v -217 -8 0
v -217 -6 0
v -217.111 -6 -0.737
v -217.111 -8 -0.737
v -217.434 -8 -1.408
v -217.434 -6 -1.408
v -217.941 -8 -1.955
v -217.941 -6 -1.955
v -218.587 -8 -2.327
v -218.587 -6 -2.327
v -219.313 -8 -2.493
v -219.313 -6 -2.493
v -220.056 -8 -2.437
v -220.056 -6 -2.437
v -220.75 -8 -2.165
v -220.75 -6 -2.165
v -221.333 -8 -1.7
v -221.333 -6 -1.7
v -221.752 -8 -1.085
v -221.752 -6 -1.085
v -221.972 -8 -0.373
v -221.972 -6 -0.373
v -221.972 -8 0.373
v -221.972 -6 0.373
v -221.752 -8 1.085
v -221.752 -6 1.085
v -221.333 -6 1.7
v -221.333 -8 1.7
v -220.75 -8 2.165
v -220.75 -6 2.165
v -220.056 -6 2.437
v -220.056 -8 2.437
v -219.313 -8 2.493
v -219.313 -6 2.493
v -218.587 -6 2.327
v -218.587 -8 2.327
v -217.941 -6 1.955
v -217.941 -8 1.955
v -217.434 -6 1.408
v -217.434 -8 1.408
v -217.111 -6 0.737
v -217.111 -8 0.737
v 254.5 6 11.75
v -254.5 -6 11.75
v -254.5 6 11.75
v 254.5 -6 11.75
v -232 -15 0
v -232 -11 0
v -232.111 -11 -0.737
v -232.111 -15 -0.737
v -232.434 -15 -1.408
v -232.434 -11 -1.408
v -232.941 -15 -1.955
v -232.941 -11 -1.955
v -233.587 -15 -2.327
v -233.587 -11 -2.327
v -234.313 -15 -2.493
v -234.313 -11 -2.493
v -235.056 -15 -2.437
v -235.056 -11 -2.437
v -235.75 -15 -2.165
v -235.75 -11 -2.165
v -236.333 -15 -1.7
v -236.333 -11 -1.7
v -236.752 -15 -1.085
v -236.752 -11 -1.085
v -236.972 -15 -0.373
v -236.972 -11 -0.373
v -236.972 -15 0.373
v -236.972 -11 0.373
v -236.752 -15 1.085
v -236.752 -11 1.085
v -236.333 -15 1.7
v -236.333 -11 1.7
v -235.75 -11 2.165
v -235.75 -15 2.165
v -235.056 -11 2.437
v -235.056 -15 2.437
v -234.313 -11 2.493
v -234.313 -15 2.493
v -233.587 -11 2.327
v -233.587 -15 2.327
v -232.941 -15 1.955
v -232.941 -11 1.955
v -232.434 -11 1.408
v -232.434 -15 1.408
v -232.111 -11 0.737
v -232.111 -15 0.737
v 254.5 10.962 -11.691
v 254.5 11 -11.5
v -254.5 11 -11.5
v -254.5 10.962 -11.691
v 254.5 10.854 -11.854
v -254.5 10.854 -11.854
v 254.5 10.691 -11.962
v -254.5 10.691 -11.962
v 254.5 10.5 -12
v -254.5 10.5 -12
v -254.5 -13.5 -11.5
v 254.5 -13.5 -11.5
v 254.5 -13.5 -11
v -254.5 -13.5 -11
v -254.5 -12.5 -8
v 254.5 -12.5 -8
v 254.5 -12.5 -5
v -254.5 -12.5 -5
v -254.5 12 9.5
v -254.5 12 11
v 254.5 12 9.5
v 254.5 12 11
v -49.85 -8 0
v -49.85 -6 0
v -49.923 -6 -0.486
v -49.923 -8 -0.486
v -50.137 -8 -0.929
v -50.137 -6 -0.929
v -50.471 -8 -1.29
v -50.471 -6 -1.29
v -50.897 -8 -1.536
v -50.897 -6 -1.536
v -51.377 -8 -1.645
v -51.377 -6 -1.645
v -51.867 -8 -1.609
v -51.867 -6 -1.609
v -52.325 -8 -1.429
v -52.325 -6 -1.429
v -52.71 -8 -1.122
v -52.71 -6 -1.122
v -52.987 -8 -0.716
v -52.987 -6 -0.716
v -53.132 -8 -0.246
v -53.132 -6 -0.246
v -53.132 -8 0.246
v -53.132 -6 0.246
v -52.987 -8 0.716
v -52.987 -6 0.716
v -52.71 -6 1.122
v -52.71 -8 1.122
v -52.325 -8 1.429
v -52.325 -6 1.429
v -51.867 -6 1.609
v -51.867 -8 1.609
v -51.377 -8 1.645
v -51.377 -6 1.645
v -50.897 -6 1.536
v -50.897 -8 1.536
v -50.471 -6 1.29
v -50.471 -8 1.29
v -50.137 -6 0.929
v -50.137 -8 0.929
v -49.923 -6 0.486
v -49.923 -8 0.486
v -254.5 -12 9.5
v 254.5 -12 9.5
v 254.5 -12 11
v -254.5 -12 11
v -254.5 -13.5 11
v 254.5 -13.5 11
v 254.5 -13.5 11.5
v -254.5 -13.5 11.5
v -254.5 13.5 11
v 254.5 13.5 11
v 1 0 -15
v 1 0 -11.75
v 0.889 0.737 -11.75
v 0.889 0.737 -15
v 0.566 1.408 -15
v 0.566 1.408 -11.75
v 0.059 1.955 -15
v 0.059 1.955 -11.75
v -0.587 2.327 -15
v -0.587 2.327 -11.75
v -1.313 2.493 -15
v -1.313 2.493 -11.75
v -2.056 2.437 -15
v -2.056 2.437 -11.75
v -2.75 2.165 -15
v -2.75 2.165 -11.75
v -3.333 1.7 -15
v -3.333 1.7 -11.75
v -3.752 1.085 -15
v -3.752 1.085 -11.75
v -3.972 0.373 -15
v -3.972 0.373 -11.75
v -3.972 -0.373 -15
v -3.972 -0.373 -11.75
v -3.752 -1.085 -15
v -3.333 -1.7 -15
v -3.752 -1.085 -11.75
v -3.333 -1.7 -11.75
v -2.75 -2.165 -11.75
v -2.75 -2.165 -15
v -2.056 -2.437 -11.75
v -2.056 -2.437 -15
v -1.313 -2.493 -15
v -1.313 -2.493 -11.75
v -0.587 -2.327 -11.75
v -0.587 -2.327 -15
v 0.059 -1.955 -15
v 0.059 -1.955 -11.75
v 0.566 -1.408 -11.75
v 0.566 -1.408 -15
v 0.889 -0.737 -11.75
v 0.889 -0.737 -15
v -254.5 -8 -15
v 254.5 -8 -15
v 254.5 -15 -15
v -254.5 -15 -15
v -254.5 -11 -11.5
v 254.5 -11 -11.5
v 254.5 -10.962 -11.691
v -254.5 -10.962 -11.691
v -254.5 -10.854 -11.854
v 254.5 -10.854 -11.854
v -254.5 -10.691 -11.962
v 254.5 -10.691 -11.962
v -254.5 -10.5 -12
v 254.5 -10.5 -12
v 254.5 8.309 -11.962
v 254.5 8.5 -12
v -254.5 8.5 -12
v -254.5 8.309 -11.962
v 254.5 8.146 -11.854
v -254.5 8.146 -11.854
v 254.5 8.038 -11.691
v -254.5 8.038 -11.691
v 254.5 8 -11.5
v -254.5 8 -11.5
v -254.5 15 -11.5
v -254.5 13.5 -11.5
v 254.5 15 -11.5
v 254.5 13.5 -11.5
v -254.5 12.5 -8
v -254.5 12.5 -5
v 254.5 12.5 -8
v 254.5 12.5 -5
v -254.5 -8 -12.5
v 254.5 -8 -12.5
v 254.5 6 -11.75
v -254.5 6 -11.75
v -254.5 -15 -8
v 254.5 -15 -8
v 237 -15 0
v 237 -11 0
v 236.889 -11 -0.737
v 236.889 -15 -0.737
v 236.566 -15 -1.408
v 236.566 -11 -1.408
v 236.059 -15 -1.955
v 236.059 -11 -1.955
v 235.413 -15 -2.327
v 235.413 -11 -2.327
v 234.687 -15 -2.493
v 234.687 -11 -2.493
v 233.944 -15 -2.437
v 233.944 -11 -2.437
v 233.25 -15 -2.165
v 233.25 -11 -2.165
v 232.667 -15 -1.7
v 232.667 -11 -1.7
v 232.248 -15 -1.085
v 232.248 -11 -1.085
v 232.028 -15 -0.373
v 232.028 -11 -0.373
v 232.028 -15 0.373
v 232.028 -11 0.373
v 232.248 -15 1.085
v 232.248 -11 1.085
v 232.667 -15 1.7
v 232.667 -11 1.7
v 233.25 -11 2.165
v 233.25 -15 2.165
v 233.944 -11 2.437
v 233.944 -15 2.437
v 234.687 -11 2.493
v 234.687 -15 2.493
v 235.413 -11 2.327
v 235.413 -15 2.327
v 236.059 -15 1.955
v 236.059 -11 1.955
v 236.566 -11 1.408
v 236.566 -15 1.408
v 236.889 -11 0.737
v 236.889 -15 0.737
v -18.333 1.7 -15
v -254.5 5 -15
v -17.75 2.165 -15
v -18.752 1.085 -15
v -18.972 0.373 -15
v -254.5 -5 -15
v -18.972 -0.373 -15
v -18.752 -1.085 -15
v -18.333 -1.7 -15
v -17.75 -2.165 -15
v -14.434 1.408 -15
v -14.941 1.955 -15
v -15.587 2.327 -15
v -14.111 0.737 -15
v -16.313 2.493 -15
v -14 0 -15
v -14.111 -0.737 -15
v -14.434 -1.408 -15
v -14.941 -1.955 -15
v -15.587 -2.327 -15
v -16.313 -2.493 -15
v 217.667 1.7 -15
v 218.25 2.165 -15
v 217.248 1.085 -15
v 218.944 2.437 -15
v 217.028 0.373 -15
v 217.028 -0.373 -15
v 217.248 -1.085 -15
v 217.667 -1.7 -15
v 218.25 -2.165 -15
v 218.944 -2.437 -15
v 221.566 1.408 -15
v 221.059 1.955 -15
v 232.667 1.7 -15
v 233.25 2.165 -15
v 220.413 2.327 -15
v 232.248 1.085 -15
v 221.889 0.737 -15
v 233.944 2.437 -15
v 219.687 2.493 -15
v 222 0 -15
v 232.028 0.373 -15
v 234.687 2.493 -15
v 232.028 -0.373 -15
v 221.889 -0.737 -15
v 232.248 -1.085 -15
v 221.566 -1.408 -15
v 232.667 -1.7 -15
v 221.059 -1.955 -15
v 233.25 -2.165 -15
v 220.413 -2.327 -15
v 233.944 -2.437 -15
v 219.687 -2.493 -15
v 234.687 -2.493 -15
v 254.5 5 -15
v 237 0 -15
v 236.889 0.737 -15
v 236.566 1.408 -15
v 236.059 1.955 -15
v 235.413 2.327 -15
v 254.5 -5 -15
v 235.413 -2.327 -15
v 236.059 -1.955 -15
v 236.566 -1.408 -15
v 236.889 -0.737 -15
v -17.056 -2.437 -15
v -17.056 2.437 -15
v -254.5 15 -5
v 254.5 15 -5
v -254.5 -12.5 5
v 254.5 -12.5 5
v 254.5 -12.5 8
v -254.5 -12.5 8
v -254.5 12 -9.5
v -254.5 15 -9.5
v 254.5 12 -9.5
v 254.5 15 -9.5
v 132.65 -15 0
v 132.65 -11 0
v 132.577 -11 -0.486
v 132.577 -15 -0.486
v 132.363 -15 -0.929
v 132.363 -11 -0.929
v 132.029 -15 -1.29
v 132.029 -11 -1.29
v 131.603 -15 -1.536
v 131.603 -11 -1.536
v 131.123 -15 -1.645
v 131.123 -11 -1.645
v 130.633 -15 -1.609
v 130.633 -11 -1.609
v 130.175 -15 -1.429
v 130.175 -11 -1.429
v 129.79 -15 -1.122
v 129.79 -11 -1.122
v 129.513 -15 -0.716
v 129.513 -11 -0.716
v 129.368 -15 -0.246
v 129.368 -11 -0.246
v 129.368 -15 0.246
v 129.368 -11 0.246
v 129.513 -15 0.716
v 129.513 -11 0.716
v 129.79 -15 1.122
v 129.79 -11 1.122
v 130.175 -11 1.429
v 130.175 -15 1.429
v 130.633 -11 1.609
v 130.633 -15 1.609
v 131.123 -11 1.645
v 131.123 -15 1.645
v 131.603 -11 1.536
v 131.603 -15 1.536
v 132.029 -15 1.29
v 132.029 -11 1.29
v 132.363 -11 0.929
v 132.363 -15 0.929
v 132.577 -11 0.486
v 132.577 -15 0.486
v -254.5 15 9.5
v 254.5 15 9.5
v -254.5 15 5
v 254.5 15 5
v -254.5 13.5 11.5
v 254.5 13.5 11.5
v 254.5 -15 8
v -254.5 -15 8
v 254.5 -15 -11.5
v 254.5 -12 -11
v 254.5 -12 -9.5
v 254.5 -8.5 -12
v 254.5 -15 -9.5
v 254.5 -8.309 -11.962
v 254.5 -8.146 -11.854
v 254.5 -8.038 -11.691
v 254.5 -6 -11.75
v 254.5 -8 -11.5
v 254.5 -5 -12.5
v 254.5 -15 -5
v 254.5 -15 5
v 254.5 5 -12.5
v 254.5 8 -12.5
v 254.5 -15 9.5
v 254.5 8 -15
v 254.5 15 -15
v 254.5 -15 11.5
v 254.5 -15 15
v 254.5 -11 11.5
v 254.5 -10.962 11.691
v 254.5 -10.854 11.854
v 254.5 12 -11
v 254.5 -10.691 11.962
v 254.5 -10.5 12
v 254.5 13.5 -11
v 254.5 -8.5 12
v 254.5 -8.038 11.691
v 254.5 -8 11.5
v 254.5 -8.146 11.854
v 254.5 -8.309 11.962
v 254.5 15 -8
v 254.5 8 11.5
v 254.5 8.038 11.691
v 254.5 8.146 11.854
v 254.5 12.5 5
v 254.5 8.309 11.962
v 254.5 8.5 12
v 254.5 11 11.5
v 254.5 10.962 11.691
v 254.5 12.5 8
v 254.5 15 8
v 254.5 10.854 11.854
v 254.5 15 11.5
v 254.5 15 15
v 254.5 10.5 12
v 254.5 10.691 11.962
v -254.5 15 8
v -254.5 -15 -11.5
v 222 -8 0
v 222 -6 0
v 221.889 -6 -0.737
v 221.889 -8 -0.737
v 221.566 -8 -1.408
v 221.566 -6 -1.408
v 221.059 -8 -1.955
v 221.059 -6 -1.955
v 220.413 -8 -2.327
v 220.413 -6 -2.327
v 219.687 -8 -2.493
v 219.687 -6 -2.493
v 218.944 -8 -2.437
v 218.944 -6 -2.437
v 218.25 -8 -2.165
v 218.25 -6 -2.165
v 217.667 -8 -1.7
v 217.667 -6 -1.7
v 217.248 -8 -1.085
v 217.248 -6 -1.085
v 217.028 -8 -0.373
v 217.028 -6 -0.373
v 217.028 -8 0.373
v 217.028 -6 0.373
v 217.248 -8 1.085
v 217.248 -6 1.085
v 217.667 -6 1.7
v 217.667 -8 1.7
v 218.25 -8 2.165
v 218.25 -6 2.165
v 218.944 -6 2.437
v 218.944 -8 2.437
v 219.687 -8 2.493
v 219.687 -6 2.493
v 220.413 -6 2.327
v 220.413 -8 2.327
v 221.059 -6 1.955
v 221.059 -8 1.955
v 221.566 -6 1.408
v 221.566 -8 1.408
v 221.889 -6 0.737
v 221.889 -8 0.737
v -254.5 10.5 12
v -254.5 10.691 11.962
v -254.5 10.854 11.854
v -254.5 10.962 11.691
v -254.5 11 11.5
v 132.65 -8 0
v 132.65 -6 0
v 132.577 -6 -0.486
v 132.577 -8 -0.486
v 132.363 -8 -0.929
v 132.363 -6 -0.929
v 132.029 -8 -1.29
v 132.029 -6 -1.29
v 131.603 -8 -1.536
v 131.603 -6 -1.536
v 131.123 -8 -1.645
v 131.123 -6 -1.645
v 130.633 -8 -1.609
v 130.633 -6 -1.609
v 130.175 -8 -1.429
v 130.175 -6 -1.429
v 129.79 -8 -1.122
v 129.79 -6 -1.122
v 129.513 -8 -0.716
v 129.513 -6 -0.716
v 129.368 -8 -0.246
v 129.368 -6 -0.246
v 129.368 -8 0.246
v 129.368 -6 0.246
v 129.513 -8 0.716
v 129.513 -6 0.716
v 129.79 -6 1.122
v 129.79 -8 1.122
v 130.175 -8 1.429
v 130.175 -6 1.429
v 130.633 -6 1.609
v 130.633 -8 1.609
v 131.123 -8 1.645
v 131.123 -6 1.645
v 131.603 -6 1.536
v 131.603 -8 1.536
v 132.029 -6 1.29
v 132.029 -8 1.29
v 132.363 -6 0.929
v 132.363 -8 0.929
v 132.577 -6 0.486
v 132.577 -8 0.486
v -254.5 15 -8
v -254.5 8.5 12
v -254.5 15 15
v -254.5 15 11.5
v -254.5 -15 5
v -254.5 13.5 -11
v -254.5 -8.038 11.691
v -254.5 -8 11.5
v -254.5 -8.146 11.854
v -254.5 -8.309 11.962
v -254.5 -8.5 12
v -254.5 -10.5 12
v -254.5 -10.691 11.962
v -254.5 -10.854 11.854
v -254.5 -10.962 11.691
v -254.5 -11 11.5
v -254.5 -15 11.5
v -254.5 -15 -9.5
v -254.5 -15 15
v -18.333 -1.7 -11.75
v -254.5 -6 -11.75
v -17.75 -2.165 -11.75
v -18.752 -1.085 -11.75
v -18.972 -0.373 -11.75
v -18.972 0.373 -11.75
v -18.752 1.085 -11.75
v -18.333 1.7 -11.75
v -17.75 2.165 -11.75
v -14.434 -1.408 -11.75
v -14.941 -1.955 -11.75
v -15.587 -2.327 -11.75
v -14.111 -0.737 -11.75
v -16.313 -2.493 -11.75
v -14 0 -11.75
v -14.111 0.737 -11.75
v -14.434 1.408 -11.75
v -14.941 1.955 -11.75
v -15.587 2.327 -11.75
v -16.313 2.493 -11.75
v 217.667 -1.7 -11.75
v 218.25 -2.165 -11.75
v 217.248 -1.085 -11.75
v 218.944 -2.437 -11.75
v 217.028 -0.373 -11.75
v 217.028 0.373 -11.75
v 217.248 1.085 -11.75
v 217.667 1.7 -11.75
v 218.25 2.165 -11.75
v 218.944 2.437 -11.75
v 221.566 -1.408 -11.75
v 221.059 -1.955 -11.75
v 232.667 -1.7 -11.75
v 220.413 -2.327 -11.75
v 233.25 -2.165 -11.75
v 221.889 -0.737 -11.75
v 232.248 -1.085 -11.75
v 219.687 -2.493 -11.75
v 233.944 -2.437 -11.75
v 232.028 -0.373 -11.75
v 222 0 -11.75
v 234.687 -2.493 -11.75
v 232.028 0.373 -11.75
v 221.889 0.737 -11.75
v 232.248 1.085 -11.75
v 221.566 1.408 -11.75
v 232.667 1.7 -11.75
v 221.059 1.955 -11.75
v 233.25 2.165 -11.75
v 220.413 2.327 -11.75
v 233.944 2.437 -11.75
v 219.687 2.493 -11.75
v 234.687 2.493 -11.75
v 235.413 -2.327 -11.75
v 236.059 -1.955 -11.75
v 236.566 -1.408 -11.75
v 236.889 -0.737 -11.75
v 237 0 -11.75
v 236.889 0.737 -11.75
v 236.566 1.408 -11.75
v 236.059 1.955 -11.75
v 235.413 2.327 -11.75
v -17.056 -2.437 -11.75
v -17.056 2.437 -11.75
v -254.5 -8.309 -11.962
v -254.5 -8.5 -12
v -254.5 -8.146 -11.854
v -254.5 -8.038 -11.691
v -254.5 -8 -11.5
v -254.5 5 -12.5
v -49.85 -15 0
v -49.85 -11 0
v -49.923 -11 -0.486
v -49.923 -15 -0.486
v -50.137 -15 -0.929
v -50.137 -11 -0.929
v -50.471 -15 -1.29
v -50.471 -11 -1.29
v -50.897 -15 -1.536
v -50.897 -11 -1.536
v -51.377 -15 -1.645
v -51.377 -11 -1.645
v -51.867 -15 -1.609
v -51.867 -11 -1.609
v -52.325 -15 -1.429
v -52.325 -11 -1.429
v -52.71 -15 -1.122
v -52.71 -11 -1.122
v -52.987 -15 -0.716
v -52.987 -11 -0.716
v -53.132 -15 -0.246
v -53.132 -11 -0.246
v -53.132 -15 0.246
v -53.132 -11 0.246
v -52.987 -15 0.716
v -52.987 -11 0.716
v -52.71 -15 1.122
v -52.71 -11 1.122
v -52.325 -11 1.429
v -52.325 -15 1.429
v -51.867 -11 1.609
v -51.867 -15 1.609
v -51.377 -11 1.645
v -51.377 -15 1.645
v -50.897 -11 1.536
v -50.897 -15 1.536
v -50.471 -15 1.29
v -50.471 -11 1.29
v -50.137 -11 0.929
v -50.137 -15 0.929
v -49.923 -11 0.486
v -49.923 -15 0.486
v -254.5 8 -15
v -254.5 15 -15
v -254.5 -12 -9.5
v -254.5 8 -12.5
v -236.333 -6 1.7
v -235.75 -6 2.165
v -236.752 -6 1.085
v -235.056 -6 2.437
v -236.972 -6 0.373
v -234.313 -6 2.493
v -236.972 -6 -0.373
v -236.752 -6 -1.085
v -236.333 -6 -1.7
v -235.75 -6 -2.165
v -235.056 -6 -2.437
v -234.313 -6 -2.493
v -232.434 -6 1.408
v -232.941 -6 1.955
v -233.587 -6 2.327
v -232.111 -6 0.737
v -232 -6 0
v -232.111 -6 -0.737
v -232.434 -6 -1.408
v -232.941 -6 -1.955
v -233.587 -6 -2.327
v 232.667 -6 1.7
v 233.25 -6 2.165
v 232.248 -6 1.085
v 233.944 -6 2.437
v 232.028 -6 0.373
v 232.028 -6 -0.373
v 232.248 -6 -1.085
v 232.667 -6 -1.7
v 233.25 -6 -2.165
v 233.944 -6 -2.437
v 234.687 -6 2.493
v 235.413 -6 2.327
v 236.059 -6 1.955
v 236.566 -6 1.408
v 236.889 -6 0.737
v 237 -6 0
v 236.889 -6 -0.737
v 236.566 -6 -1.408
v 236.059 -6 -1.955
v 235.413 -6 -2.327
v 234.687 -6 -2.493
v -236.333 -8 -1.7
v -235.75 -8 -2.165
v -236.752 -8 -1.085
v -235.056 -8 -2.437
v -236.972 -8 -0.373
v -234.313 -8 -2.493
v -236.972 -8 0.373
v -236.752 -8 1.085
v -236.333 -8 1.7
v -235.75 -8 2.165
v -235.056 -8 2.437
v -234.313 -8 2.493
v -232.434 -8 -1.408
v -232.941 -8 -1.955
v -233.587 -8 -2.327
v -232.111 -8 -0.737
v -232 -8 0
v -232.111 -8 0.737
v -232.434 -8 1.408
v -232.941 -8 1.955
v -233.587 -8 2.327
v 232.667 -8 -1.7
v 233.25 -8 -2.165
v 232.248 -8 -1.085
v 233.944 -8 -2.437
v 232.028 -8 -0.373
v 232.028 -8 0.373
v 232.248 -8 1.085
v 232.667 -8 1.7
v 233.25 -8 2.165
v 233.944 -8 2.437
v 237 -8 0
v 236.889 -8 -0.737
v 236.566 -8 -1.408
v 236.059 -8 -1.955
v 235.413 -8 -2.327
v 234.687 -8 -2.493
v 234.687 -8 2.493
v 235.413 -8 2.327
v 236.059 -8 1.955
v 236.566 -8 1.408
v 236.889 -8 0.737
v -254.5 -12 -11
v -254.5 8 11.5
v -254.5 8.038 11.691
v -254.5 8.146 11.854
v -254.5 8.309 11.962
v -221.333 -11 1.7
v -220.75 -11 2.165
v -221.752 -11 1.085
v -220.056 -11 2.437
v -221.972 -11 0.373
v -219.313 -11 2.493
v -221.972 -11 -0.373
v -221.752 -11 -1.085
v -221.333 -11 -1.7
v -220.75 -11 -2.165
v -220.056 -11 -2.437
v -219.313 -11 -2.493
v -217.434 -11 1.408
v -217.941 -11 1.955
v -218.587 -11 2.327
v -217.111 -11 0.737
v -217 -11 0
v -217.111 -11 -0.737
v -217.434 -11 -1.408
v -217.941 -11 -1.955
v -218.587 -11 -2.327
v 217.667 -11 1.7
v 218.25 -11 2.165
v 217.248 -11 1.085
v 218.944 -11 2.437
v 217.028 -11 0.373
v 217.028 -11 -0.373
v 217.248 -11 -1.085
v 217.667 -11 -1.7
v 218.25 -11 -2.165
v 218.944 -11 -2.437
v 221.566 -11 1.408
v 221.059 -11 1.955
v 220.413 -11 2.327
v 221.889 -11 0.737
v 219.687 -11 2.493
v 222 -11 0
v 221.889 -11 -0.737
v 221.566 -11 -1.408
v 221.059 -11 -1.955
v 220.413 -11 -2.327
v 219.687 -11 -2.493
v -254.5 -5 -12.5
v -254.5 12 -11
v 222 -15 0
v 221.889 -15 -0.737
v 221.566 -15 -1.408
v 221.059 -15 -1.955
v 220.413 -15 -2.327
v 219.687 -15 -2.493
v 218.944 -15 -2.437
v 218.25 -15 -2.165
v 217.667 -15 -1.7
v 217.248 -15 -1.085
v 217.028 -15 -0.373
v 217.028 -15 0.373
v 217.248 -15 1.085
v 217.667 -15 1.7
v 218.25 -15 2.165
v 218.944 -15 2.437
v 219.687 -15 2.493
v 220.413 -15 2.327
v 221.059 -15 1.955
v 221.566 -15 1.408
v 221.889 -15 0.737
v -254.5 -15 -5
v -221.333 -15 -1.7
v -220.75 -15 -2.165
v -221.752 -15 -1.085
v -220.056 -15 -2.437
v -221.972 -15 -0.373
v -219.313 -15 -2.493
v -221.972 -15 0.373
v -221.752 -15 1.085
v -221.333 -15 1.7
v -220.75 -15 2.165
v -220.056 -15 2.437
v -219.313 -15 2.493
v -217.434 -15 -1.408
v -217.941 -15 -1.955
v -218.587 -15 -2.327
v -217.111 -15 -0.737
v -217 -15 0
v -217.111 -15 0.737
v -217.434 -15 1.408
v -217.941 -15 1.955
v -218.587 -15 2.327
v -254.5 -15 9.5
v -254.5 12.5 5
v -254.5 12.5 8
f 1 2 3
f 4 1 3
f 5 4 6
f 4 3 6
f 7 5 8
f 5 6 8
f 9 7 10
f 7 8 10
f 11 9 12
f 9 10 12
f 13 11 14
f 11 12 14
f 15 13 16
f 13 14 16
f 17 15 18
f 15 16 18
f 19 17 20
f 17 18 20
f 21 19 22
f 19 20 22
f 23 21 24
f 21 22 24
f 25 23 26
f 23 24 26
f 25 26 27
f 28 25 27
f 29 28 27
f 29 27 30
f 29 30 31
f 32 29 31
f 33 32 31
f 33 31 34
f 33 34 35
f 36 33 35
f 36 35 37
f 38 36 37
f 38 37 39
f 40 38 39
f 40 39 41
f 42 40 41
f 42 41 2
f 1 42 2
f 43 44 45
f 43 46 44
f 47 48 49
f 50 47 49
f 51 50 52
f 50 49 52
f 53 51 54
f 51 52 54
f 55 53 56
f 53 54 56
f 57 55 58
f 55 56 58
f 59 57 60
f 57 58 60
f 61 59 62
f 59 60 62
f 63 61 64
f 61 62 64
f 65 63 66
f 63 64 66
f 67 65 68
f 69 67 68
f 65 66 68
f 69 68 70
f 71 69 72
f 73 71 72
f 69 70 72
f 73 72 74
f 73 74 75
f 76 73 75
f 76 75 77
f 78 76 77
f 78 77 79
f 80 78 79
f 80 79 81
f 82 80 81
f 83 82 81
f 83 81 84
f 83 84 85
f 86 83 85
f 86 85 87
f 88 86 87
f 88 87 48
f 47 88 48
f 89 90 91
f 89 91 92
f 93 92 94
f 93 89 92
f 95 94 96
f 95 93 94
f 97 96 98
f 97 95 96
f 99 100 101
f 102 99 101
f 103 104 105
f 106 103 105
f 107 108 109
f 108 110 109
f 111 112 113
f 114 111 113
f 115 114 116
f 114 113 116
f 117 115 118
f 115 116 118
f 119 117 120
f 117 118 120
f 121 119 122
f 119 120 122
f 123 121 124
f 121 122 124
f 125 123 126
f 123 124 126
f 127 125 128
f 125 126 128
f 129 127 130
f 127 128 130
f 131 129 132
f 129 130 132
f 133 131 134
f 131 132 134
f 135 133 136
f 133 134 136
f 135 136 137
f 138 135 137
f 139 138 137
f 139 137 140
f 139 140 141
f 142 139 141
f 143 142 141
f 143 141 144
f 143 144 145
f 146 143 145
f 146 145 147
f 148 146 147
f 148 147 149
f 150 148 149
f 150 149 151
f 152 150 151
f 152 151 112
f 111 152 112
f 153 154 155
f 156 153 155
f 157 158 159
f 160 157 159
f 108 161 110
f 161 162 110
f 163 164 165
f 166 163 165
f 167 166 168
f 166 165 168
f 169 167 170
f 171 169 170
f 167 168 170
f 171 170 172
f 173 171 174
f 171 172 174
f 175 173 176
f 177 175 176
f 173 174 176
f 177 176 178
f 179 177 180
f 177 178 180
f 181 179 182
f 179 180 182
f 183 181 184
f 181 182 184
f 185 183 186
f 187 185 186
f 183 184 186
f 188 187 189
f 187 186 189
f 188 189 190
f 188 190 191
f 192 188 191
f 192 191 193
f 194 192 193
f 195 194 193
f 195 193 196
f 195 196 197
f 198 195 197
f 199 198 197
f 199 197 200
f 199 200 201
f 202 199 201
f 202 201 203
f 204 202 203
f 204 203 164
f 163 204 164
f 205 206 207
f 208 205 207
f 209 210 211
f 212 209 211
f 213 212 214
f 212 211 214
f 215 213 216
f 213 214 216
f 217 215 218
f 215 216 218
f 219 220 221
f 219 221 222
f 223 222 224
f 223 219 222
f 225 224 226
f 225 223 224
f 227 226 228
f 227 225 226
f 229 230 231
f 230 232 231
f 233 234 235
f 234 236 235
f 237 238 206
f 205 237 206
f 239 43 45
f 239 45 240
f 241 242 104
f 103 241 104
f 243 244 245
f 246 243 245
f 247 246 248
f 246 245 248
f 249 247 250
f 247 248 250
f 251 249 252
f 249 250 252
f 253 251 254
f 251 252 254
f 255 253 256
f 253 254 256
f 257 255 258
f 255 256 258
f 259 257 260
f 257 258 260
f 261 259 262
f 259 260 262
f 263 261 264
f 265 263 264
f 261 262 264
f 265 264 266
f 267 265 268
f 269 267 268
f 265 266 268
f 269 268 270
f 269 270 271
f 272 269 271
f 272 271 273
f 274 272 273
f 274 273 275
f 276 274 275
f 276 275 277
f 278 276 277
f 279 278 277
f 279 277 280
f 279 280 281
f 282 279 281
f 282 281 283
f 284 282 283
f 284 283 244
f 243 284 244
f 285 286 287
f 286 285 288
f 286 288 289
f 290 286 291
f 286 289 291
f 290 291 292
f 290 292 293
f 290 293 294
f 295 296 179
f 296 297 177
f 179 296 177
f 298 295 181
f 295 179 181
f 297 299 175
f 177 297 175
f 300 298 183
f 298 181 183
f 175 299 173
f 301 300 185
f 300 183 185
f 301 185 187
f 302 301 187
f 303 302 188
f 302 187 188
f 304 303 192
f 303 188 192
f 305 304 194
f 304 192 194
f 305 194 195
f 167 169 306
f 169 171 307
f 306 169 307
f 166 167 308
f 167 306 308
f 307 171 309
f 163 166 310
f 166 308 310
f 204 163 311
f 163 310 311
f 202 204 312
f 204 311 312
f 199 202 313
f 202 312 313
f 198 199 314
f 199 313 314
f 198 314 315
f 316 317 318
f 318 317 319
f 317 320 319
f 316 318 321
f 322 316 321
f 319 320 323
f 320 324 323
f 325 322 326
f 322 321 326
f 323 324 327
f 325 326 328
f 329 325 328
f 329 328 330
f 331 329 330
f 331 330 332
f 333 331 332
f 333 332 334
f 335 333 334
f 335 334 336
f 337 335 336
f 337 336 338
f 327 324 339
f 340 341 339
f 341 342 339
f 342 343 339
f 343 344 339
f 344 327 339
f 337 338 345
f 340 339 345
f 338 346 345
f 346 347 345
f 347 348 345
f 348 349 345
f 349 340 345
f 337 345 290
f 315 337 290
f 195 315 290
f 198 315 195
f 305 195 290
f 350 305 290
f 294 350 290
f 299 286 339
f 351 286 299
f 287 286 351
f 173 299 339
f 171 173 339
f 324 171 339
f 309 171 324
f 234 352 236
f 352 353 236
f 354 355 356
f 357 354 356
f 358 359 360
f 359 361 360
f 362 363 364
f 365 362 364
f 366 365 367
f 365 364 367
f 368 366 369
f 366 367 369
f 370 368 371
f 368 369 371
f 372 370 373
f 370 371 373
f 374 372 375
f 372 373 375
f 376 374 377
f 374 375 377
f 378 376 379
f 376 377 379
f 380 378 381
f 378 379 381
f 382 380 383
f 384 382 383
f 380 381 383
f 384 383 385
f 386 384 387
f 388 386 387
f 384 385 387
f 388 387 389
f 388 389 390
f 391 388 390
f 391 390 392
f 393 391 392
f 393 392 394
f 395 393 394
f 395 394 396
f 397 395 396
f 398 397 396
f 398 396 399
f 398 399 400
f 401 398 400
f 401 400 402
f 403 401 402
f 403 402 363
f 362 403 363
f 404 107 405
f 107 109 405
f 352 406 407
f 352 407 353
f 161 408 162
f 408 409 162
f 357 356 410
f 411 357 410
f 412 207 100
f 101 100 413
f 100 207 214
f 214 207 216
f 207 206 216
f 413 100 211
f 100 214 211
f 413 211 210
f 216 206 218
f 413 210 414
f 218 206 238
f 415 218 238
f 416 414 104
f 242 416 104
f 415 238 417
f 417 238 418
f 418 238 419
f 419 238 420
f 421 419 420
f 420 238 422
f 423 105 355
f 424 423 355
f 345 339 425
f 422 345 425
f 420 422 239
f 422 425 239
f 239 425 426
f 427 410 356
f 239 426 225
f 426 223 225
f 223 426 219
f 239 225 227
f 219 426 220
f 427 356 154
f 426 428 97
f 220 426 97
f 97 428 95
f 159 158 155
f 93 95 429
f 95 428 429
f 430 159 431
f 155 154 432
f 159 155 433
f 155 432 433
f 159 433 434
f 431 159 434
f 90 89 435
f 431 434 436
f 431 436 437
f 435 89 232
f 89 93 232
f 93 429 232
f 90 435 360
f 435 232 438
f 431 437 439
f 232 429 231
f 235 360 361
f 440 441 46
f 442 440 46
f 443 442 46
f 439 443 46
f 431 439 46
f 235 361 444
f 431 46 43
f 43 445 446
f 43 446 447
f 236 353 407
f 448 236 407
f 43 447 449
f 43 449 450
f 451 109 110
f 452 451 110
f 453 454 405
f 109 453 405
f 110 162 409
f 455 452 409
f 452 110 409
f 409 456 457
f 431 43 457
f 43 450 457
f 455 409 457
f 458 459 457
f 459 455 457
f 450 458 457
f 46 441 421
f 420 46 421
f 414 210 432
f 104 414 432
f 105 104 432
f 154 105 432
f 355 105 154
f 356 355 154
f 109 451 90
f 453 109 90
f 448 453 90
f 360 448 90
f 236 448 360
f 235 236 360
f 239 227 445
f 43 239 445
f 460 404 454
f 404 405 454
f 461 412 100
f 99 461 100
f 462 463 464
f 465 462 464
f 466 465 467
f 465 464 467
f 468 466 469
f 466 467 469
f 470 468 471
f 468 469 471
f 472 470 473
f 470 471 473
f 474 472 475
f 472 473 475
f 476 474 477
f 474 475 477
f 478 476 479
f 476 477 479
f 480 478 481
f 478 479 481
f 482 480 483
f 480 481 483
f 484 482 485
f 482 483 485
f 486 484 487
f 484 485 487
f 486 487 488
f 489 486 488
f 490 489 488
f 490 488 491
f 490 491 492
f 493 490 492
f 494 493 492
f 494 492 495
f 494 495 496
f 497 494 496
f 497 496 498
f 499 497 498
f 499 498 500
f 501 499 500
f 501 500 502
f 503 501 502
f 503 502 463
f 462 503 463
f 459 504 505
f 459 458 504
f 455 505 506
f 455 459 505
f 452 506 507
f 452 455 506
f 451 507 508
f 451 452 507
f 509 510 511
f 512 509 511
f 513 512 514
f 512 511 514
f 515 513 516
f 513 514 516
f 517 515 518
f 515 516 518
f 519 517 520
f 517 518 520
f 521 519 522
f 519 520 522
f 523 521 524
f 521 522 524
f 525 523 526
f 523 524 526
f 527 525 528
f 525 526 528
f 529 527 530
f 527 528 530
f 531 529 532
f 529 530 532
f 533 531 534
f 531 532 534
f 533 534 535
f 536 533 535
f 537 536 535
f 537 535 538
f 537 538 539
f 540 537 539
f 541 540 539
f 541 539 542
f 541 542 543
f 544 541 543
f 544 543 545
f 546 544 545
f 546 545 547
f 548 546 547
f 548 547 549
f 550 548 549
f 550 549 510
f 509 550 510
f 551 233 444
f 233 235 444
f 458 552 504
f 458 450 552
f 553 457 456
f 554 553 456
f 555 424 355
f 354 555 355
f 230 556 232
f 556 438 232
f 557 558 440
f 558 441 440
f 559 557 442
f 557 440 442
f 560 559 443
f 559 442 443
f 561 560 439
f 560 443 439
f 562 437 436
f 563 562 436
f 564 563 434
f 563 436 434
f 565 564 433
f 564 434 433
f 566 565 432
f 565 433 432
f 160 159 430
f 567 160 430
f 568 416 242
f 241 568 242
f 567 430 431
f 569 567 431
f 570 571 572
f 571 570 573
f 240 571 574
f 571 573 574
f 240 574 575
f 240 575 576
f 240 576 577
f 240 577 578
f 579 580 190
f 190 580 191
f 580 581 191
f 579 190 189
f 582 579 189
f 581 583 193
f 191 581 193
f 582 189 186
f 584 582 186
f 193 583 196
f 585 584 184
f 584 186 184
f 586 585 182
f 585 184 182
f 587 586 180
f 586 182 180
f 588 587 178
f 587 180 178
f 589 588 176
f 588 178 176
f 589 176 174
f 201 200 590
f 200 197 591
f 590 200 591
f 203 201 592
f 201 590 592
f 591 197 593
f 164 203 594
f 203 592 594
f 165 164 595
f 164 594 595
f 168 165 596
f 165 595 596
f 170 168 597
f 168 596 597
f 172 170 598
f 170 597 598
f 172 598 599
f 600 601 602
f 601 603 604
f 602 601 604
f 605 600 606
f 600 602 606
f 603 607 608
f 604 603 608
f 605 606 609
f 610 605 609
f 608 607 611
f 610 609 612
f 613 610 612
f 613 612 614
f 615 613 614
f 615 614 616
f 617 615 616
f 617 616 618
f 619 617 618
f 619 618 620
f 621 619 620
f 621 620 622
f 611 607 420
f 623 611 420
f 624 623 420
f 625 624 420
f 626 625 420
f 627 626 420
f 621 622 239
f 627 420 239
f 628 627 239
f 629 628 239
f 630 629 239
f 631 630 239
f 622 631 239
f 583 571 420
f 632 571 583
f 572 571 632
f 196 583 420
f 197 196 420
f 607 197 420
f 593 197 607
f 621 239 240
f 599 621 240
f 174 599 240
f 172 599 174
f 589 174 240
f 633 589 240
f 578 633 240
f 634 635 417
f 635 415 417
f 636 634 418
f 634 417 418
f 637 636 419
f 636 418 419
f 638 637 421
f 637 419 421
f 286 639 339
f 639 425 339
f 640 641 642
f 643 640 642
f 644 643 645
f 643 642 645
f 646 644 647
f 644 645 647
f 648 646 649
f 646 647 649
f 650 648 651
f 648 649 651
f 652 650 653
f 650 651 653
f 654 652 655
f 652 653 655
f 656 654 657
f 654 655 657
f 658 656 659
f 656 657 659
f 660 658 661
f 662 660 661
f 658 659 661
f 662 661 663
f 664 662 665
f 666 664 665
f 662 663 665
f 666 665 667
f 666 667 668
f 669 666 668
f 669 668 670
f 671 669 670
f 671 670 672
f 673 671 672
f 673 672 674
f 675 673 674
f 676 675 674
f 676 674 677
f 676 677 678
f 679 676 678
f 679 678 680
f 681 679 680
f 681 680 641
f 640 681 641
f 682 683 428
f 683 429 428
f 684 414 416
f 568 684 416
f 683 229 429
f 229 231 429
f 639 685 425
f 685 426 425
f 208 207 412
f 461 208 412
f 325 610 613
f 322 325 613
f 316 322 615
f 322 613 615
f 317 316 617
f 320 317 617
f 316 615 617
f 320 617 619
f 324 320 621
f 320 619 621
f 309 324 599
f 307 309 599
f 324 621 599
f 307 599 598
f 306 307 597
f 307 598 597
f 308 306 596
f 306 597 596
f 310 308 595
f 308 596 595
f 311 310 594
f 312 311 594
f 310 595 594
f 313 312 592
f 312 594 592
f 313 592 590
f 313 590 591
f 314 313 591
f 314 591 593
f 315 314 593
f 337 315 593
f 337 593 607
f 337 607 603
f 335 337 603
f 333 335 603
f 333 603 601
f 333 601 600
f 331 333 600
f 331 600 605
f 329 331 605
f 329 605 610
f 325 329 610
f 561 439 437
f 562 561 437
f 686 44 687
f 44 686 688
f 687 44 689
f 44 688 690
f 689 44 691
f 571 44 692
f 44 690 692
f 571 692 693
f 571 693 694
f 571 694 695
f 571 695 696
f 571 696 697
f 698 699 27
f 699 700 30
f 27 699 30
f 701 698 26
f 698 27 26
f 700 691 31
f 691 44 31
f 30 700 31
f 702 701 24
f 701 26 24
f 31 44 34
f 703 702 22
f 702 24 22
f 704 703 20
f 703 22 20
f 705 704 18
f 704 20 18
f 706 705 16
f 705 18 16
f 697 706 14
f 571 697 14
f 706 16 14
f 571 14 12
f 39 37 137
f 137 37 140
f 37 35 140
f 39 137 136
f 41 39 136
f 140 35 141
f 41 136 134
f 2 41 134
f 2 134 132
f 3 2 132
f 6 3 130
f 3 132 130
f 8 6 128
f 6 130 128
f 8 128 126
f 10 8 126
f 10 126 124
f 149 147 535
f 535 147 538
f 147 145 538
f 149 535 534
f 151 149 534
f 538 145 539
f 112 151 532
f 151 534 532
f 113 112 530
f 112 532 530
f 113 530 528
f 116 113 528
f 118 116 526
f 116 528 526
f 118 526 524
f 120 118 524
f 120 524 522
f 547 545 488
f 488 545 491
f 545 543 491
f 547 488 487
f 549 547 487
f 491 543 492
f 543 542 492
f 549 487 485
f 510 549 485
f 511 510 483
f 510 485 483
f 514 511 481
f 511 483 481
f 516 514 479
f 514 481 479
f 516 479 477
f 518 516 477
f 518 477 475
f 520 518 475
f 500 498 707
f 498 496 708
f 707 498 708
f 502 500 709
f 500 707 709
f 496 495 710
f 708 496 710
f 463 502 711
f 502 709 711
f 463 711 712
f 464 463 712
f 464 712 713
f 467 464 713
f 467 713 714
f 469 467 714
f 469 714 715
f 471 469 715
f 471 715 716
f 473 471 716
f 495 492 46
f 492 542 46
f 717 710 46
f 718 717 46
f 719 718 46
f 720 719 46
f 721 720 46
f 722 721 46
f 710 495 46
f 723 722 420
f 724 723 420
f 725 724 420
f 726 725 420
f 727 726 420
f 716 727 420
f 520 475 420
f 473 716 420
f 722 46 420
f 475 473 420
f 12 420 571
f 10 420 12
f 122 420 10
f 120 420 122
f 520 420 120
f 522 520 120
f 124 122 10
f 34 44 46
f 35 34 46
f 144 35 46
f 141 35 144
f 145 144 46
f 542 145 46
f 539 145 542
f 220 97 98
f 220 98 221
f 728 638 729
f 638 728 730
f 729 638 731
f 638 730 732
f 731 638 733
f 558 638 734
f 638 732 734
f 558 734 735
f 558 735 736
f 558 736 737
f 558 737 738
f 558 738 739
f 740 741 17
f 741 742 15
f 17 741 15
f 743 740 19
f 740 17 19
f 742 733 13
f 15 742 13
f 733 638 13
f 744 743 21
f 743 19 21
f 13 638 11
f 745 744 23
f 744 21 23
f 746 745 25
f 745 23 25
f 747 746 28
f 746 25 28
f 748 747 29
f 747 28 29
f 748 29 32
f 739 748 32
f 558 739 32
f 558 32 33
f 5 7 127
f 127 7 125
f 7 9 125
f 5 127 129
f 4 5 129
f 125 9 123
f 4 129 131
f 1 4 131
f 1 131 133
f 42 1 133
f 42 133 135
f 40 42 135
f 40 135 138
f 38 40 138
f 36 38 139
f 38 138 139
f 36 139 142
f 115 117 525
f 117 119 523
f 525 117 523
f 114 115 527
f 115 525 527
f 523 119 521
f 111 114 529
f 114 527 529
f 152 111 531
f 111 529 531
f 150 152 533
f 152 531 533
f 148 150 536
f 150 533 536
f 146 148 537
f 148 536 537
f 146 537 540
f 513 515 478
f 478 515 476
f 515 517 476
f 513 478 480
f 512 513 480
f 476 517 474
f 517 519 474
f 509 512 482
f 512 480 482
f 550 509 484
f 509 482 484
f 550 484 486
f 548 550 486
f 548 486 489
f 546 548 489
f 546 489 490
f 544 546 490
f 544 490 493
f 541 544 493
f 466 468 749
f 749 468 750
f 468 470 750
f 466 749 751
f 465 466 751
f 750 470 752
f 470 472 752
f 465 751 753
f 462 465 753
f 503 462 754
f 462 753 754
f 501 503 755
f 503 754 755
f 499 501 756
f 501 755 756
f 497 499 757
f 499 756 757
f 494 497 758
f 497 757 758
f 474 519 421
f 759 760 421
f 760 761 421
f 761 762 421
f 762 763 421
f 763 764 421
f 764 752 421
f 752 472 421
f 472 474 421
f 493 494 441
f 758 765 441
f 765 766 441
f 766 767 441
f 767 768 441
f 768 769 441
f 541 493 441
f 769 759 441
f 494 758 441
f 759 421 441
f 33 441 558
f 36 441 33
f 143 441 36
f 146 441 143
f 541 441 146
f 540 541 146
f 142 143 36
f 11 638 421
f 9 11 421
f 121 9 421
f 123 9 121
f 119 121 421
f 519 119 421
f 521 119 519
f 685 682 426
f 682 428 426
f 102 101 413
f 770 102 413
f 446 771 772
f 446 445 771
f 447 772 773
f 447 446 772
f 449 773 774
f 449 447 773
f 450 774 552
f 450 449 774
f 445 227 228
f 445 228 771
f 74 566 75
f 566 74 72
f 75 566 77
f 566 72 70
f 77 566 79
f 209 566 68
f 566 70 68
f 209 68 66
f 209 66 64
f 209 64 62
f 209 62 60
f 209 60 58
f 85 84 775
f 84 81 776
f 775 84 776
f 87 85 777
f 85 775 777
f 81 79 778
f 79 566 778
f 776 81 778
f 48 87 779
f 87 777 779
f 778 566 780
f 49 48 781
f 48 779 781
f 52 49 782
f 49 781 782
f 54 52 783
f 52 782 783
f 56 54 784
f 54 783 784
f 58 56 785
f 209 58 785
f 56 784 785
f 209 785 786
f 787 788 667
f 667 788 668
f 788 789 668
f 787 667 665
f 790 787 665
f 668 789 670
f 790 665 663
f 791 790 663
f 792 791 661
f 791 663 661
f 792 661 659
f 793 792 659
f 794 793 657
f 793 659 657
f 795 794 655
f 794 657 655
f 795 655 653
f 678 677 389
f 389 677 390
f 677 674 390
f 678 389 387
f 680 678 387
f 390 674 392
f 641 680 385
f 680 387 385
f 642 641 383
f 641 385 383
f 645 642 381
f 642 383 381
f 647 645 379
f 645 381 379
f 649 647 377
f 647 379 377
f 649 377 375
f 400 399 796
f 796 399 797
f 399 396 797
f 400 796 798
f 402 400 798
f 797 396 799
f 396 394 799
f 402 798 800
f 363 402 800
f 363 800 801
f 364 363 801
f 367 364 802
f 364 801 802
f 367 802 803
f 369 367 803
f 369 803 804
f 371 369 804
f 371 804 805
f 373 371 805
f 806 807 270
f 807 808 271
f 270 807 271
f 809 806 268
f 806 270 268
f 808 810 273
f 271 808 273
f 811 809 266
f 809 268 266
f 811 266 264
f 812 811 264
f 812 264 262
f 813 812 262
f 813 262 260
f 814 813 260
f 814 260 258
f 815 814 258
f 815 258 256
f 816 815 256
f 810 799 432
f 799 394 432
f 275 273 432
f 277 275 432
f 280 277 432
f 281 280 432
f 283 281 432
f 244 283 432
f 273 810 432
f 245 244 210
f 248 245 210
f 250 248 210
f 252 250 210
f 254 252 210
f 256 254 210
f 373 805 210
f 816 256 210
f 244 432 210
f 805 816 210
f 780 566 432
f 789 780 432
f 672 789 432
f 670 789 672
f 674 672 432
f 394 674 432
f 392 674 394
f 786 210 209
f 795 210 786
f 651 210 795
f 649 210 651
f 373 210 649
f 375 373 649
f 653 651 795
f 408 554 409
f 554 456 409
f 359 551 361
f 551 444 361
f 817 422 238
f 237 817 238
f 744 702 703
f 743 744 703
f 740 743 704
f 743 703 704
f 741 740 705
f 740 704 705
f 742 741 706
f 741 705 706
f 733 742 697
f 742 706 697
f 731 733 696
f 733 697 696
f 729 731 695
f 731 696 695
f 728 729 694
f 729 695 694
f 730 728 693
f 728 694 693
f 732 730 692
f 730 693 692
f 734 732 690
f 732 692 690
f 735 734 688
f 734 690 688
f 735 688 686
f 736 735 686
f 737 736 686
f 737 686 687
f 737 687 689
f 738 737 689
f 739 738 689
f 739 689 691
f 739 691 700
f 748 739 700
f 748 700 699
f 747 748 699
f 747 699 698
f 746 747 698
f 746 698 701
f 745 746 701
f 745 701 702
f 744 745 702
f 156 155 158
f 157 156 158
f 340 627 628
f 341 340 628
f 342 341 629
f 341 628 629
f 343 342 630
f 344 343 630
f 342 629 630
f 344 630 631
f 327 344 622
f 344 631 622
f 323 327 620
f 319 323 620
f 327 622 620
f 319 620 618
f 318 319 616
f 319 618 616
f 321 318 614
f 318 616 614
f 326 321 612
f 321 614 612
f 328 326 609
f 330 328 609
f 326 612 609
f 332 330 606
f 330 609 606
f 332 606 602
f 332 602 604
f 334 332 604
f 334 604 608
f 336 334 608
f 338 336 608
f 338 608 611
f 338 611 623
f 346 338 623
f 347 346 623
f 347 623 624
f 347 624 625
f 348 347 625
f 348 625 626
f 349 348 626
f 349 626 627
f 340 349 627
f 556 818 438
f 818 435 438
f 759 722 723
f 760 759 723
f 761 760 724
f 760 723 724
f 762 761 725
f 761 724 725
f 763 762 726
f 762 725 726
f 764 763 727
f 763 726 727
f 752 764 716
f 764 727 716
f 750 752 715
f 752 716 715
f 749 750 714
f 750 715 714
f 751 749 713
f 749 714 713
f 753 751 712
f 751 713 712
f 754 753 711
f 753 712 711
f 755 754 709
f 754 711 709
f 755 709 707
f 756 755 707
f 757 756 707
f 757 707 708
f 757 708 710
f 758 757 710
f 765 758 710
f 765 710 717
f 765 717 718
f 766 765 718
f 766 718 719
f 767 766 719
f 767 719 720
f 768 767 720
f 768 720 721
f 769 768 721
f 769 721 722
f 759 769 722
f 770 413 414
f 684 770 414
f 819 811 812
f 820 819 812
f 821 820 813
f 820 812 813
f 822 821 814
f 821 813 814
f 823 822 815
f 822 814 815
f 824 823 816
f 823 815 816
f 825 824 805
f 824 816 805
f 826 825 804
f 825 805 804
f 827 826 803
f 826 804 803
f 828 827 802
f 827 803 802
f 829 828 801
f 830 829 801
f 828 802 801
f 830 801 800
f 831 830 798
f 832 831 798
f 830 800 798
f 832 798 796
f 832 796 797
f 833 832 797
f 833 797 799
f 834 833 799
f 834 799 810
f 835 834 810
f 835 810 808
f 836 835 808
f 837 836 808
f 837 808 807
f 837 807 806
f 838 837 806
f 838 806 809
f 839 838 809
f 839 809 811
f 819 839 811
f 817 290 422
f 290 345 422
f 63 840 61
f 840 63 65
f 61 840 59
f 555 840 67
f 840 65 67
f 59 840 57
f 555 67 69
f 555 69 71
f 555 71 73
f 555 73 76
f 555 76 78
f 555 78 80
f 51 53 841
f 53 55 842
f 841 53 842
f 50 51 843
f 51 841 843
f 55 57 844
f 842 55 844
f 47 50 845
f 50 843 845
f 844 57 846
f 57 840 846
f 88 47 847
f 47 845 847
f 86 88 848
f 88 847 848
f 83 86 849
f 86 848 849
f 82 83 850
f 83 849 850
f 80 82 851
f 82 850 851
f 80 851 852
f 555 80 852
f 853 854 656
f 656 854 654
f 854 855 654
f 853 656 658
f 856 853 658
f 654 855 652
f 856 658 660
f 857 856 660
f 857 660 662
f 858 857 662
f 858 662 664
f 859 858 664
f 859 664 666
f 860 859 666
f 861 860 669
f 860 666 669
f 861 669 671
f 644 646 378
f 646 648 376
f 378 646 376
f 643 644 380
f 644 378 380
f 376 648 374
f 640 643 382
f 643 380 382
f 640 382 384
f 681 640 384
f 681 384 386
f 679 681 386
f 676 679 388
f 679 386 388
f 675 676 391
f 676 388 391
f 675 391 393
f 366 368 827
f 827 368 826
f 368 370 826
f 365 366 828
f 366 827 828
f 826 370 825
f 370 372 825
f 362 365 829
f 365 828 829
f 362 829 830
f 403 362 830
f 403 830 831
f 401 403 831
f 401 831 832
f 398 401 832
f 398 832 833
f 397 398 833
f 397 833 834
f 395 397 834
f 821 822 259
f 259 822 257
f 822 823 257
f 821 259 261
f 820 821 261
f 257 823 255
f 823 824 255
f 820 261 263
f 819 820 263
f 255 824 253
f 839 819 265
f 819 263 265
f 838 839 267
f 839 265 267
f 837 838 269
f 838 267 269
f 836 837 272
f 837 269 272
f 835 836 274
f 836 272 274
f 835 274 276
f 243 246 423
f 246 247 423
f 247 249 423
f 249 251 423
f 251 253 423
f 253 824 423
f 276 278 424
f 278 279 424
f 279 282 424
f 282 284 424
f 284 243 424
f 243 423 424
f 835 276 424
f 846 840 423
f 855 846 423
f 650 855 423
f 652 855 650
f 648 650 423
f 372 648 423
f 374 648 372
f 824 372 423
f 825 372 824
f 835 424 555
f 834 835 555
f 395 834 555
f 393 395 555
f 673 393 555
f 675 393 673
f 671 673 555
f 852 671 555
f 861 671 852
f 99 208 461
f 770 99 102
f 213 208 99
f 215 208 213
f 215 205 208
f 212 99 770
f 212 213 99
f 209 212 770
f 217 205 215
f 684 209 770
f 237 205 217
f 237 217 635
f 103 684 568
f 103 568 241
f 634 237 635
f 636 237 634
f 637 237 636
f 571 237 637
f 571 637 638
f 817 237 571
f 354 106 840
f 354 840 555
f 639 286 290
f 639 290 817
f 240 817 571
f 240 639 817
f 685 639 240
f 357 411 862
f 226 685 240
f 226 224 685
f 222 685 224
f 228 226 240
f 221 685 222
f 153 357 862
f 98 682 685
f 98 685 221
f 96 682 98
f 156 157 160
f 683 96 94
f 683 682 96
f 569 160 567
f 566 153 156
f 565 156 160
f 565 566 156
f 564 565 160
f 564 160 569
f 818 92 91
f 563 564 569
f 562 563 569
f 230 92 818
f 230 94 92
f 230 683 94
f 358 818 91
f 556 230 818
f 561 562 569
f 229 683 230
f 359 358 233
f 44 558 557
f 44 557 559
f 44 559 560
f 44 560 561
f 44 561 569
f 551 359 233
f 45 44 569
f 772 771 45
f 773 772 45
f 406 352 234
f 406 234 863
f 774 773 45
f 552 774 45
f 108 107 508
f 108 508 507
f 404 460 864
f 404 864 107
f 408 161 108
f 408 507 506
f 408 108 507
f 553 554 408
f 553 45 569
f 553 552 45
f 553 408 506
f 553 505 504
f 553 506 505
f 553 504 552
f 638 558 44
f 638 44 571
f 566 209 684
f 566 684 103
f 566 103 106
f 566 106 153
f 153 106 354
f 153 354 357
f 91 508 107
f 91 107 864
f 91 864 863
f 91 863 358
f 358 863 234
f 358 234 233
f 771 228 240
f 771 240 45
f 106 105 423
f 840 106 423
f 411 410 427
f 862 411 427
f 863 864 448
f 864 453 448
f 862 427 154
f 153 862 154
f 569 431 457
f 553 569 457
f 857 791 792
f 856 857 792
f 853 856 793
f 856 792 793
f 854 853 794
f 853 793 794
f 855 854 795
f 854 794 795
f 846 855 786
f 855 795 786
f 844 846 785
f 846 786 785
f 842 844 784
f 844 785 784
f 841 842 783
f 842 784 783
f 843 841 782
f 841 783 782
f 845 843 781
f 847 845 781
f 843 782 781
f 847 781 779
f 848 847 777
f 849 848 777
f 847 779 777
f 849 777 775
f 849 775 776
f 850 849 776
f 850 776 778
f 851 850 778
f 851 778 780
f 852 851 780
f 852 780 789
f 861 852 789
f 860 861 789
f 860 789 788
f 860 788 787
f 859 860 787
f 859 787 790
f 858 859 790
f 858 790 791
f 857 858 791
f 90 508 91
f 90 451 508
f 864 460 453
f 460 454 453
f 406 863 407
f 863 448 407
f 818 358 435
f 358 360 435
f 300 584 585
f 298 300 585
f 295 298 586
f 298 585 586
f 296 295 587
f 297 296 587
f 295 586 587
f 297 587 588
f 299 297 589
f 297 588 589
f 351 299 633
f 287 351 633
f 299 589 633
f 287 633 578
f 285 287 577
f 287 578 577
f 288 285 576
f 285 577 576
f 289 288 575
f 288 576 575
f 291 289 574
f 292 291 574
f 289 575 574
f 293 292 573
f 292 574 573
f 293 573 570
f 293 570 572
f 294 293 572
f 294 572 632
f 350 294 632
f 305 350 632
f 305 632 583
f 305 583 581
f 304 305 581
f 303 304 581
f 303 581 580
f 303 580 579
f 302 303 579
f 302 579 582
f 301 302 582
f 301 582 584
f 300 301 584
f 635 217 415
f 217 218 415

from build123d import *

# Parameters (mm, degrees)
SKETCH_1_W             = 23.5
SKETCH_1_H             = 12
EXTRUDE_1_DEPTH        = 254.5
HOLE_WIZARD_M6_1_D     = 5
HOLE_WIZARD_M6_1_DEPTH = 19
HOLE_WIZARD_M6_1_TIP   = 1.502151548
HOLE_WIZARD_M6_2_D     = 5
HOLE_WIZARD_M6_2_DEPTH = 19
HOLE_WIZARD_M6_2_TIP   = 1.502151548
HOLE_WIZARD_M4_1_D     = 3.3
HOLE_WIZARD_M4_1_DEPTH = 11.5
HOLE_WIZARD_M4_1_TIP   = 0.991420021


with BuildPart() as part:
    # 草图1 → 凸台-拉伸1 (new, symmetric)
    with BuildSketch(Plane(origin=(0, 0, 0), x_dir=(0, 0, -1), z_dir=(1, 0, 0))):
        Polygon((-15, 15), (-11.5, 15), (-11.5, 13.5), (-11, 13.5), (-11, 12), (-9.5, 12), (-9.5, 15), (-8, 15), (-8, 12.5), (-5, 12.5), (-5, 15), (5, 15), (5, 12.5), (8, 12.5), (8, 15), (9.5, 15), (9.5, 12), (11, 12), (11, 13.5), (11.5, 13.5), (11.5, 15), (15, 15), (15, 8), (12.5, 8), (12.5, 5), (15, 5), (15, -5), (12.5, -5), (12.5, -8), (15, -8), (15, -15), (11.5, -15), (11.5, -13.5), (11, -13.5), (11, -12), (9.5, -12), (9.5, -15), (8, -15), (8, -12.5), (5, -12.5), (5, -15), (-5, -15), (-5, -12.5), (-8, -12.5), (-8, -15), (-9.5, -15), (-9.5, -12), (-11, -12), (-11, -13.5), (-11.5, -13.5), (-11.5, -15), (-15, -15), align=None)
        with BuildLine():
            Line((12, -10.5), (12, -8.5))
            ThreePointArc((12, -8.5), (11.853553391, -8.146446609), (11.5, -8))
            Line((11.5, -8), (-11.5, -8))
            ThreePointArc((-11.5, -8), (-11.853553391, -8.146446609), (-12, -8.5))
            Line((-12, -8.5), (-12, -10.5))
            ThreePointArc((-12, -10.5), (-11.853553391, -10.853553391), (-11.5, -11))
            Line((-11.5, -11), (11.5, -11))
            ThreePointArc((11.5, -11), (11.853553391, -10.853553391), (12, -10.5))
        make_face(mode=Mode.SUBTRACT)
        with BuildLine():
            Line((-11.5, 11), (11.5, 11))
            ThreePointArc((11.5, 11), (11.853553391, 10.853553391), (12, 10.5))
            Line((12, 10.5), (12, 8.5))
            ThreePointArc((12, 8.5), (11.853553391, 8.146446609), (11.5, 8))
            Line((11.5, 8), (-11.5, 8))
            ThreePointArc((-11.5, 8), (-11.853553391, 8.146446609), (-12, 8.5))
            Line((-12, 8.5), (-12, 10.5))
            ThreePointArc((-12, 10.5), (-11.853553391, 10.853553391), (-11.5, 11))
        make_face(mode=Mode.SUBTRACT)
        Rectangle(SKETCH_1_W, SKETCH_1_H, mode=Mode.SUBTRACT)
    extrude(amount=EXTRUDE_1_DEPTH, both=True)

    # M6 螺纹孔1
    with Locations(Plane(origin=(0, 0, -15), x_dir=(-1, 0, 0), z_dir=(0, 0, -1))):
        with Locations((16.5, 0), (1.5, 0), (-219.5, 0), (-234.5, 0)):
            Hole(HOLE_WIZARD_M6_1_D / 2, depth=HOLE_WIZARD_M6_1_DEPTH)
            with Locations((0, 0, -(HOLE_WIZARD_M6_1_DEPTH + HOLE_WIZARD_M6_1_TIP / 2))):  # 118° drill point
                Cone(0, HOLE_WIZARD_M6_1_D / 2, HOLE_WIZARD_M6_1_TIP, mode=Mode.SUBTRACT)

    # M6 螺纹孔2
    with Locations(Plane(origin=(0, -15, 0), x_dir=(-1, 0, 0), z_dir=(0, -1, 0))):
        with Locations((-219.5, 0), (-234.5, 0), (234.5, 0), (219.5, 0)):
            Hole(HOLE_WIZARD_M6_2_D / 2, depth=HOLE_WIZARD_M6_2_DEPTH)
            with Locations((0, 0, -(HOLE_WIZARD_M6_2_DEPTH + HOLE_WIZARD_M6_2_TIP / 2))):  # 118° drill point
                Cone(0, HOLE_WIZARD_M6_2_D / 2, HOLE_WIZARD_M6_2_TIP, mode=Mode.SUBTRACT)

    # M4 螺纹孔1
    with Locations(Plane(origin=(0, -15, 0), x_dir=(-1, 0, 0), z_dir=(0, -1, 0))):
        with Locations((-131, 0), (51.5, 0)):
            Hole(HOLE_WIZARD_M4_1_D / 2, depth=HOLE_WIZARD_M4_1_DEPTH)
            with Locations((0, 0, -(HOLE_WIZARD_M4_1_DEPTH + HOLE_WIZARD_M4_1_TIP / 2))):  # 118° drill point
                Cone(0, HOLE_WIZARD_M4_1_D / 2, HOLE_WIZARD_M4_1_TIP, mode=Mode.SUBTRACT)


solid = part.part
